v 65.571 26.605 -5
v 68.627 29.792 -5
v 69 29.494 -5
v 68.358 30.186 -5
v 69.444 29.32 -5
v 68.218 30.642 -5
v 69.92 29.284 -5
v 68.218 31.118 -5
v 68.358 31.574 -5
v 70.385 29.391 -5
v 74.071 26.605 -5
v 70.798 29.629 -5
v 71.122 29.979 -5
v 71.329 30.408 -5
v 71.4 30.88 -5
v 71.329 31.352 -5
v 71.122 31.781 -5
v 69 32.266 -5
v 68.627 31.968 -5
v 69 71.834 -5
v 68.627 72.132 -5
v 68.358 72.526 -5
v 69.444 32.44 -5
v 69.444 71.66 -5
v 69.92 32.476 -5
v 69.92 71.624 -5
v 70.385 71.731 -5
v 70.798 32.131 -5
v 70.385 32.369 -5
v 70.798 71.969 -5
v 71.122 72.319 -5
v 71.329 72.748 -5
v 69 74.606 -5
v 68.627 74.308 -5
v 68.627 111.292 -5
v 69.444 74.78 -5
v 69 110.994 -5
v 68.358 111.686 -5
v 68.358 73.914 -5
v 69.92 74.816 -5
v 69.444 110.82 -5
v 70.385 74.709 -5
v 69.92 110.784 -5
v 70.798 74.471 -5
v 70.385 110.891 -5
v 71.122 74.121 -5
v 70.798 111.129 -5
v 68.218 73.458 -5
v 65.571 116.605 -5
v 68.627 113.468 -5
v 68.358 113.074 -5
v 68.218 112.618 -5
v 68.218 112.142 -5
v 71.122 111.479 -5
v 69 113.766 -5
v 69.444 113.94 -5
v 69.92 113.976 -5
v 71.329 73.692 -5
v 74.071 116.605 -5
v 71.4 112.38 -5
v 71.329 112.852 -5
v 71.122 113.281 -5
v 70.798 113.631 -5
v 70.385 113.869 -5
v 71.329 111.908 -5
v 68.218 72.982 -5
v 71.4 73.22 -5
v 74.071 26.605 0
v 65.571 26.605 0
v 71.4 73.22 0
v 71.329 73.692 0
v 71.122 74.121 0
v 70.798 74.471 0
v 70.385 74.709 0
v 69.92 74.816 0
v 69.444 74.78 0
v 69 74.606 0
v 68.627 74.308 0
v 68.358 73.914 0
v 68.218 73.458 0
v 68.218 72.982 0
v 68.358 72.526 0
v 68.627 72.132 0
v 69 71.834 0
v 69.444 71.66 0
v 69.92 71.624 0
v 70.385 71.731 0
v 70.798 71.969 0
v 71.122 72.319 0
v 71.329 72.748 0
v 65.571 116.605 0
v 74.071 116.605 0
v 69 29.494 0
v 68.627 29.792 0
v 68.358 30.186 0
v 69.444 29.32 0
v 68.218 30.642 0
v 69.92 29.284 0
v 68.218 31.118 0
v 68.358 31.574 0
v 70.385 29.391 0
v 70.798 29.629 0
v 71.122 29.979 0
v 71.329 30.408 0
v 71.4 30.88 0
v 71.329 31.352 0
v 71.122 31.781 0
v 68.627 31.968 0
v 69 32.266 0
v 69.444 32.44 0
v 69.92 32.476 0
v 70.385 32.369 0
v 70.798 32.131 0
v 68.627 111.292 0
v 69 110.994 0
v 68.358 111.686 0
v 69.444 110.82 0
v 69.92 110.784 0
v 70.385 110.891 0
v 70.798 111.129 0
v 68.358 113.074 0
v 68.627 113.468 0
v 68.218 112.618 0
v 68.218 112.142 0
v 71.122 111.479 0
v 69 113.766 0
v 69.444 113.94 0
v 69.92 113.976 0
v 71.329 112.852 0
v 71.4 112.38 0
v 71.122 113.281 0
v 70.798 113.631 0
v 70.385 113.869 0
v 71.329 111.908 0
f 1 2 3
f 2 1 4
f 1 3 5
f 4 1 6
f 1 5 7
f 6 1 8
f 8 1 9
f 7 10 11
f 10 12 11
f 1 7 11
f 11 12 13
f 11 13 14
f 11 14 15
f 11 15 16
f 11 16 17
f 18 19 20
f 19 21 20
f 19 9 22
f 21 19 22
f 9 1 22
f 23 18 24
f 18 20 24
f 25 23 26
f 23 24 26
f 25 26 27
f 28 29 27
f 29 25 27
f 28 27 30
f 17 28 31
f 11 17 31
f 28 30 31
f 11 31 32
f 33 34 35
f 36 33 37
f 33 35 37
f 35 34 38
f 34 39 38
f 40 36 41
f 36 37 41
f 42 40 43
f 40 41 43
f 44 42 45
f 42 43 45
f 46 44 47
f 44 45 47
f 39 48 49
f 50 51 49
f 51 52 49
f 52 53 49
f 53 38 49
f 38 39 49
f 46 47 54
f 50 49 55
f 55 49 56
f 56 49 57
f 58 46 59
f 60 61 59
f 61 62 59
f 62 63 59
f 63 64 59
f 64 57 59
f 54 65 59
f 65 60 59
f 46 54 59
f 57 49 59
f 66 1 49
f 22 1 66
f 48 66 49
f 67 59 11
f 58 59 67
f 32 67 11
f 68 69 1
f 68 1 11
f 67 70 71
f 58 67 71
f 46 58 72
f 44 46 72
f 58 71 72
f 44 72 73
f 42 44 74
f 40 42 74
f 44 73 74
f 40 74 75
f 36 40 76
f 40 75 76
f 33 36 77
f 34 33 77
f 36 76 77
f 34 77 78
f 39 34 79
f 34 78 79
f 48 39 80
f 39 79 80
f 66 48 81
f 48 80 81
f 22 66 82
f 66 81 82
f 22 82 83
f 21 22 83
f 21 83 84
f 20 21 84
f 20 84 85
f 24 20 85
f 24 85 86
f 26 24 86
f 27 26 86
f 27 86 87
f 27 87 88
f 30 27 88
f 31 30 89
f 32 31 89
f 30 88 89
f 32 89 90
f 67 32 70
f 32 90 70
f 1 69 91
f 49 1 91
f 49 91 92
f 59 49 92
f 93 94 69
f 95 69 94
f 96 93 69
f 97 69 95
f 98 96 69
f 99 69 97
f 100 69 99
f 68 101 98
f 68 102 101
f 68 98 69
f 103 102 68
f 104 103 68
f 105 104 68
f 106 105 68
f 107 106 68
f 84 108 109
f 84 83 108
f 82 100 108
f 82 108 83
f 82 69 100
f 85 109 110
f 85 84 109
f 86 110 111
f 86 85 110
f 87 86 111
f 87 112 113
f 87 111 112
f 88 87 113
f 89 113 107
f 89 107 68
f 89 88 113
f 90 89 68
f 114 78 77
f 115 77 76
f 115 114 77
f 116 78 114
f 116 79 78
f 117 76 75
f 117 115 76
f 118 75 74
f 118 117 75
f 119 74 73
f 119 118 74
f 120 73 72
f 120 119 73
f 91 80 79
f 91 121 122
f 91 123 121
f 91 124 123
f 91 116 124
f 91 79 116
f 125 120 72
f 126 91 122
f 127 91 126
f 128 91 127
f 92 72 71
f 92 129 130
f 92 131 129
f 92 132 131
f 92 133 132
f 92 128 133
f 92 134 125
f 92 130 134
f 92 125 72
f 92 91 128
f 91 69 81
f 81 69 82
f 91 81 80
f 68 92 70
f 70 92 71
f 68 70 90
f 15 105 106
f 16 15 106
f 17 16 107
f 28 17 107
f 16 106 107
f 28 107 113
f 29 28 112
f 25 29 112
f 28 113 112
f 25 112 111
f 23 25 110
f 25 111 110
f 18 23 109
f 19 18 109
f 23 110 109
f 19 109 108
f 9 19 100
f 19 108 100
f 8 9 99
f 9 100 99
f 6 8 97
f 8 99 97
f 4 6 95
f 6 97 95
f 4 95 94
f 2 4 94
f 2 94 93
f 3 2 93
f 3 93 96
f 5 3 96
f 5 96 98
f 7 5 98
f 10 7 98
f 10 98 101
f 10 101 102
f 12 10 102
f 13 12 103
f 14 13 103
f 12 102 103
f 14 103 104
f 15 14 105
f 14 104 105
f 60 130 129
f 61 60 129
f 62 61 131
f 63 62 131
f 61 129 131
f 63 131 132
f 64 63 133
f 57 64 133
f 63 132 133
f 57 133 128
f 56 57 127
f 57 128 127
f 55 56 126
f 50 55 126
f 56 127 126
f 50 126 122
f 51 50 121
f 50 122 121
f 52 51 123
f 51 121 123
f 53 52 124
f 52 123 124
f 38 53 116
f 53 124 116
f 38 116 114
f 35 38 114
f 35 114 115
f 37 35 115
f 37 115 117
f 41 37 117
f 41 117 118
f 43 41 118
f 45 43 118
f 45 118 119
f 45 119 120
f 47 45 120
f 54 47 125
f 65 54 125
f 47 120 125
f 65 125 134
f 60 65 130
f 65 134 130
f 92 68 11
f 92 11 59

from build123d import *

# Parameters (mm, degrees)
SKETCH019_W      = 8.5
SKETCH019_H      = 90
EXTRUDE015_DEPTH = 5
SKETCH020_R      = 1.6
HOLE006_DEPTH    = 5
HOLE006_TIPS_R   = 1.6


with BuildPart() as part:
    # Sketch019 (on Face9 of BaseFeature002) → Extrude015 (new body)
    with BuildSketch(Plane.XY):
        with Locations((69.820944, 71.605001)):
            Rectangle(SKETCH019_W, SKETCH019_H)
    extrude(amount=-EXTRUDE015_DEPTH)

    # Sketch020 (on Face5 of Extrude015) → Hole006 (cut)
    with BuildSketch(Plane.XY):
        with Locations((69.800003, 112.380005)):
            Circle(SKETCH020_R)
        with Locations((69.799998, 73.219998)):
            Circle(SKETCH020_R)
        with Locations((69.799998, 30.879999)):
            Circle(SKETCH020_R)
    extrude(amount=-HOLE006_DEPTH, mode=Mode.SUBTRACT)

    # Hole006 tips → Hole006 tip 1 section 0
    with BuildSketch(Plane.XY.offset(-5), mode=Mode.PRIVATE) as hole006_tip_1_s0:
        with Locations((69.800003, 112.380005)):
            Circle(HOLE006_TIPS_R)
    loft([hole006_tip_1_s0.sketch, Vertex(69.800003, 112.380005, -5.961377)], mode=Mode.SUBTRACT)

    # Hole006 tips → Hole006 tip 2 section 0
    with BuildSketch(Plane.XY.offset(-5), mode=Mode.PRIVATE) as hole006_tip_2_s0:
        with Locations((69.799998, 73.219998)):
            Circle(HOLE006_TIPS_R)
    loft([hole006_tip_2_s0.sketch, Vertex(69.799998, 73.219998, -5.961377)], mode=Mode.SUBTRACT)

    # Hole006 tips → Hole006 tip 3 section 0
    with BuildSketch(Plane.XY.offset(-5), mode=Mode.PRIVATE) as hole006_tip_3_s0:
        with Locations((69.799998, 30.879999)):
            Circle(HOLE006_TIPS_R)
    loft([hole006_tip_3_s0.sketch, Vertex(69.799998, 30.879999, -5.961377)], mode=Mode.SUBTRACT)


solid = part.part
